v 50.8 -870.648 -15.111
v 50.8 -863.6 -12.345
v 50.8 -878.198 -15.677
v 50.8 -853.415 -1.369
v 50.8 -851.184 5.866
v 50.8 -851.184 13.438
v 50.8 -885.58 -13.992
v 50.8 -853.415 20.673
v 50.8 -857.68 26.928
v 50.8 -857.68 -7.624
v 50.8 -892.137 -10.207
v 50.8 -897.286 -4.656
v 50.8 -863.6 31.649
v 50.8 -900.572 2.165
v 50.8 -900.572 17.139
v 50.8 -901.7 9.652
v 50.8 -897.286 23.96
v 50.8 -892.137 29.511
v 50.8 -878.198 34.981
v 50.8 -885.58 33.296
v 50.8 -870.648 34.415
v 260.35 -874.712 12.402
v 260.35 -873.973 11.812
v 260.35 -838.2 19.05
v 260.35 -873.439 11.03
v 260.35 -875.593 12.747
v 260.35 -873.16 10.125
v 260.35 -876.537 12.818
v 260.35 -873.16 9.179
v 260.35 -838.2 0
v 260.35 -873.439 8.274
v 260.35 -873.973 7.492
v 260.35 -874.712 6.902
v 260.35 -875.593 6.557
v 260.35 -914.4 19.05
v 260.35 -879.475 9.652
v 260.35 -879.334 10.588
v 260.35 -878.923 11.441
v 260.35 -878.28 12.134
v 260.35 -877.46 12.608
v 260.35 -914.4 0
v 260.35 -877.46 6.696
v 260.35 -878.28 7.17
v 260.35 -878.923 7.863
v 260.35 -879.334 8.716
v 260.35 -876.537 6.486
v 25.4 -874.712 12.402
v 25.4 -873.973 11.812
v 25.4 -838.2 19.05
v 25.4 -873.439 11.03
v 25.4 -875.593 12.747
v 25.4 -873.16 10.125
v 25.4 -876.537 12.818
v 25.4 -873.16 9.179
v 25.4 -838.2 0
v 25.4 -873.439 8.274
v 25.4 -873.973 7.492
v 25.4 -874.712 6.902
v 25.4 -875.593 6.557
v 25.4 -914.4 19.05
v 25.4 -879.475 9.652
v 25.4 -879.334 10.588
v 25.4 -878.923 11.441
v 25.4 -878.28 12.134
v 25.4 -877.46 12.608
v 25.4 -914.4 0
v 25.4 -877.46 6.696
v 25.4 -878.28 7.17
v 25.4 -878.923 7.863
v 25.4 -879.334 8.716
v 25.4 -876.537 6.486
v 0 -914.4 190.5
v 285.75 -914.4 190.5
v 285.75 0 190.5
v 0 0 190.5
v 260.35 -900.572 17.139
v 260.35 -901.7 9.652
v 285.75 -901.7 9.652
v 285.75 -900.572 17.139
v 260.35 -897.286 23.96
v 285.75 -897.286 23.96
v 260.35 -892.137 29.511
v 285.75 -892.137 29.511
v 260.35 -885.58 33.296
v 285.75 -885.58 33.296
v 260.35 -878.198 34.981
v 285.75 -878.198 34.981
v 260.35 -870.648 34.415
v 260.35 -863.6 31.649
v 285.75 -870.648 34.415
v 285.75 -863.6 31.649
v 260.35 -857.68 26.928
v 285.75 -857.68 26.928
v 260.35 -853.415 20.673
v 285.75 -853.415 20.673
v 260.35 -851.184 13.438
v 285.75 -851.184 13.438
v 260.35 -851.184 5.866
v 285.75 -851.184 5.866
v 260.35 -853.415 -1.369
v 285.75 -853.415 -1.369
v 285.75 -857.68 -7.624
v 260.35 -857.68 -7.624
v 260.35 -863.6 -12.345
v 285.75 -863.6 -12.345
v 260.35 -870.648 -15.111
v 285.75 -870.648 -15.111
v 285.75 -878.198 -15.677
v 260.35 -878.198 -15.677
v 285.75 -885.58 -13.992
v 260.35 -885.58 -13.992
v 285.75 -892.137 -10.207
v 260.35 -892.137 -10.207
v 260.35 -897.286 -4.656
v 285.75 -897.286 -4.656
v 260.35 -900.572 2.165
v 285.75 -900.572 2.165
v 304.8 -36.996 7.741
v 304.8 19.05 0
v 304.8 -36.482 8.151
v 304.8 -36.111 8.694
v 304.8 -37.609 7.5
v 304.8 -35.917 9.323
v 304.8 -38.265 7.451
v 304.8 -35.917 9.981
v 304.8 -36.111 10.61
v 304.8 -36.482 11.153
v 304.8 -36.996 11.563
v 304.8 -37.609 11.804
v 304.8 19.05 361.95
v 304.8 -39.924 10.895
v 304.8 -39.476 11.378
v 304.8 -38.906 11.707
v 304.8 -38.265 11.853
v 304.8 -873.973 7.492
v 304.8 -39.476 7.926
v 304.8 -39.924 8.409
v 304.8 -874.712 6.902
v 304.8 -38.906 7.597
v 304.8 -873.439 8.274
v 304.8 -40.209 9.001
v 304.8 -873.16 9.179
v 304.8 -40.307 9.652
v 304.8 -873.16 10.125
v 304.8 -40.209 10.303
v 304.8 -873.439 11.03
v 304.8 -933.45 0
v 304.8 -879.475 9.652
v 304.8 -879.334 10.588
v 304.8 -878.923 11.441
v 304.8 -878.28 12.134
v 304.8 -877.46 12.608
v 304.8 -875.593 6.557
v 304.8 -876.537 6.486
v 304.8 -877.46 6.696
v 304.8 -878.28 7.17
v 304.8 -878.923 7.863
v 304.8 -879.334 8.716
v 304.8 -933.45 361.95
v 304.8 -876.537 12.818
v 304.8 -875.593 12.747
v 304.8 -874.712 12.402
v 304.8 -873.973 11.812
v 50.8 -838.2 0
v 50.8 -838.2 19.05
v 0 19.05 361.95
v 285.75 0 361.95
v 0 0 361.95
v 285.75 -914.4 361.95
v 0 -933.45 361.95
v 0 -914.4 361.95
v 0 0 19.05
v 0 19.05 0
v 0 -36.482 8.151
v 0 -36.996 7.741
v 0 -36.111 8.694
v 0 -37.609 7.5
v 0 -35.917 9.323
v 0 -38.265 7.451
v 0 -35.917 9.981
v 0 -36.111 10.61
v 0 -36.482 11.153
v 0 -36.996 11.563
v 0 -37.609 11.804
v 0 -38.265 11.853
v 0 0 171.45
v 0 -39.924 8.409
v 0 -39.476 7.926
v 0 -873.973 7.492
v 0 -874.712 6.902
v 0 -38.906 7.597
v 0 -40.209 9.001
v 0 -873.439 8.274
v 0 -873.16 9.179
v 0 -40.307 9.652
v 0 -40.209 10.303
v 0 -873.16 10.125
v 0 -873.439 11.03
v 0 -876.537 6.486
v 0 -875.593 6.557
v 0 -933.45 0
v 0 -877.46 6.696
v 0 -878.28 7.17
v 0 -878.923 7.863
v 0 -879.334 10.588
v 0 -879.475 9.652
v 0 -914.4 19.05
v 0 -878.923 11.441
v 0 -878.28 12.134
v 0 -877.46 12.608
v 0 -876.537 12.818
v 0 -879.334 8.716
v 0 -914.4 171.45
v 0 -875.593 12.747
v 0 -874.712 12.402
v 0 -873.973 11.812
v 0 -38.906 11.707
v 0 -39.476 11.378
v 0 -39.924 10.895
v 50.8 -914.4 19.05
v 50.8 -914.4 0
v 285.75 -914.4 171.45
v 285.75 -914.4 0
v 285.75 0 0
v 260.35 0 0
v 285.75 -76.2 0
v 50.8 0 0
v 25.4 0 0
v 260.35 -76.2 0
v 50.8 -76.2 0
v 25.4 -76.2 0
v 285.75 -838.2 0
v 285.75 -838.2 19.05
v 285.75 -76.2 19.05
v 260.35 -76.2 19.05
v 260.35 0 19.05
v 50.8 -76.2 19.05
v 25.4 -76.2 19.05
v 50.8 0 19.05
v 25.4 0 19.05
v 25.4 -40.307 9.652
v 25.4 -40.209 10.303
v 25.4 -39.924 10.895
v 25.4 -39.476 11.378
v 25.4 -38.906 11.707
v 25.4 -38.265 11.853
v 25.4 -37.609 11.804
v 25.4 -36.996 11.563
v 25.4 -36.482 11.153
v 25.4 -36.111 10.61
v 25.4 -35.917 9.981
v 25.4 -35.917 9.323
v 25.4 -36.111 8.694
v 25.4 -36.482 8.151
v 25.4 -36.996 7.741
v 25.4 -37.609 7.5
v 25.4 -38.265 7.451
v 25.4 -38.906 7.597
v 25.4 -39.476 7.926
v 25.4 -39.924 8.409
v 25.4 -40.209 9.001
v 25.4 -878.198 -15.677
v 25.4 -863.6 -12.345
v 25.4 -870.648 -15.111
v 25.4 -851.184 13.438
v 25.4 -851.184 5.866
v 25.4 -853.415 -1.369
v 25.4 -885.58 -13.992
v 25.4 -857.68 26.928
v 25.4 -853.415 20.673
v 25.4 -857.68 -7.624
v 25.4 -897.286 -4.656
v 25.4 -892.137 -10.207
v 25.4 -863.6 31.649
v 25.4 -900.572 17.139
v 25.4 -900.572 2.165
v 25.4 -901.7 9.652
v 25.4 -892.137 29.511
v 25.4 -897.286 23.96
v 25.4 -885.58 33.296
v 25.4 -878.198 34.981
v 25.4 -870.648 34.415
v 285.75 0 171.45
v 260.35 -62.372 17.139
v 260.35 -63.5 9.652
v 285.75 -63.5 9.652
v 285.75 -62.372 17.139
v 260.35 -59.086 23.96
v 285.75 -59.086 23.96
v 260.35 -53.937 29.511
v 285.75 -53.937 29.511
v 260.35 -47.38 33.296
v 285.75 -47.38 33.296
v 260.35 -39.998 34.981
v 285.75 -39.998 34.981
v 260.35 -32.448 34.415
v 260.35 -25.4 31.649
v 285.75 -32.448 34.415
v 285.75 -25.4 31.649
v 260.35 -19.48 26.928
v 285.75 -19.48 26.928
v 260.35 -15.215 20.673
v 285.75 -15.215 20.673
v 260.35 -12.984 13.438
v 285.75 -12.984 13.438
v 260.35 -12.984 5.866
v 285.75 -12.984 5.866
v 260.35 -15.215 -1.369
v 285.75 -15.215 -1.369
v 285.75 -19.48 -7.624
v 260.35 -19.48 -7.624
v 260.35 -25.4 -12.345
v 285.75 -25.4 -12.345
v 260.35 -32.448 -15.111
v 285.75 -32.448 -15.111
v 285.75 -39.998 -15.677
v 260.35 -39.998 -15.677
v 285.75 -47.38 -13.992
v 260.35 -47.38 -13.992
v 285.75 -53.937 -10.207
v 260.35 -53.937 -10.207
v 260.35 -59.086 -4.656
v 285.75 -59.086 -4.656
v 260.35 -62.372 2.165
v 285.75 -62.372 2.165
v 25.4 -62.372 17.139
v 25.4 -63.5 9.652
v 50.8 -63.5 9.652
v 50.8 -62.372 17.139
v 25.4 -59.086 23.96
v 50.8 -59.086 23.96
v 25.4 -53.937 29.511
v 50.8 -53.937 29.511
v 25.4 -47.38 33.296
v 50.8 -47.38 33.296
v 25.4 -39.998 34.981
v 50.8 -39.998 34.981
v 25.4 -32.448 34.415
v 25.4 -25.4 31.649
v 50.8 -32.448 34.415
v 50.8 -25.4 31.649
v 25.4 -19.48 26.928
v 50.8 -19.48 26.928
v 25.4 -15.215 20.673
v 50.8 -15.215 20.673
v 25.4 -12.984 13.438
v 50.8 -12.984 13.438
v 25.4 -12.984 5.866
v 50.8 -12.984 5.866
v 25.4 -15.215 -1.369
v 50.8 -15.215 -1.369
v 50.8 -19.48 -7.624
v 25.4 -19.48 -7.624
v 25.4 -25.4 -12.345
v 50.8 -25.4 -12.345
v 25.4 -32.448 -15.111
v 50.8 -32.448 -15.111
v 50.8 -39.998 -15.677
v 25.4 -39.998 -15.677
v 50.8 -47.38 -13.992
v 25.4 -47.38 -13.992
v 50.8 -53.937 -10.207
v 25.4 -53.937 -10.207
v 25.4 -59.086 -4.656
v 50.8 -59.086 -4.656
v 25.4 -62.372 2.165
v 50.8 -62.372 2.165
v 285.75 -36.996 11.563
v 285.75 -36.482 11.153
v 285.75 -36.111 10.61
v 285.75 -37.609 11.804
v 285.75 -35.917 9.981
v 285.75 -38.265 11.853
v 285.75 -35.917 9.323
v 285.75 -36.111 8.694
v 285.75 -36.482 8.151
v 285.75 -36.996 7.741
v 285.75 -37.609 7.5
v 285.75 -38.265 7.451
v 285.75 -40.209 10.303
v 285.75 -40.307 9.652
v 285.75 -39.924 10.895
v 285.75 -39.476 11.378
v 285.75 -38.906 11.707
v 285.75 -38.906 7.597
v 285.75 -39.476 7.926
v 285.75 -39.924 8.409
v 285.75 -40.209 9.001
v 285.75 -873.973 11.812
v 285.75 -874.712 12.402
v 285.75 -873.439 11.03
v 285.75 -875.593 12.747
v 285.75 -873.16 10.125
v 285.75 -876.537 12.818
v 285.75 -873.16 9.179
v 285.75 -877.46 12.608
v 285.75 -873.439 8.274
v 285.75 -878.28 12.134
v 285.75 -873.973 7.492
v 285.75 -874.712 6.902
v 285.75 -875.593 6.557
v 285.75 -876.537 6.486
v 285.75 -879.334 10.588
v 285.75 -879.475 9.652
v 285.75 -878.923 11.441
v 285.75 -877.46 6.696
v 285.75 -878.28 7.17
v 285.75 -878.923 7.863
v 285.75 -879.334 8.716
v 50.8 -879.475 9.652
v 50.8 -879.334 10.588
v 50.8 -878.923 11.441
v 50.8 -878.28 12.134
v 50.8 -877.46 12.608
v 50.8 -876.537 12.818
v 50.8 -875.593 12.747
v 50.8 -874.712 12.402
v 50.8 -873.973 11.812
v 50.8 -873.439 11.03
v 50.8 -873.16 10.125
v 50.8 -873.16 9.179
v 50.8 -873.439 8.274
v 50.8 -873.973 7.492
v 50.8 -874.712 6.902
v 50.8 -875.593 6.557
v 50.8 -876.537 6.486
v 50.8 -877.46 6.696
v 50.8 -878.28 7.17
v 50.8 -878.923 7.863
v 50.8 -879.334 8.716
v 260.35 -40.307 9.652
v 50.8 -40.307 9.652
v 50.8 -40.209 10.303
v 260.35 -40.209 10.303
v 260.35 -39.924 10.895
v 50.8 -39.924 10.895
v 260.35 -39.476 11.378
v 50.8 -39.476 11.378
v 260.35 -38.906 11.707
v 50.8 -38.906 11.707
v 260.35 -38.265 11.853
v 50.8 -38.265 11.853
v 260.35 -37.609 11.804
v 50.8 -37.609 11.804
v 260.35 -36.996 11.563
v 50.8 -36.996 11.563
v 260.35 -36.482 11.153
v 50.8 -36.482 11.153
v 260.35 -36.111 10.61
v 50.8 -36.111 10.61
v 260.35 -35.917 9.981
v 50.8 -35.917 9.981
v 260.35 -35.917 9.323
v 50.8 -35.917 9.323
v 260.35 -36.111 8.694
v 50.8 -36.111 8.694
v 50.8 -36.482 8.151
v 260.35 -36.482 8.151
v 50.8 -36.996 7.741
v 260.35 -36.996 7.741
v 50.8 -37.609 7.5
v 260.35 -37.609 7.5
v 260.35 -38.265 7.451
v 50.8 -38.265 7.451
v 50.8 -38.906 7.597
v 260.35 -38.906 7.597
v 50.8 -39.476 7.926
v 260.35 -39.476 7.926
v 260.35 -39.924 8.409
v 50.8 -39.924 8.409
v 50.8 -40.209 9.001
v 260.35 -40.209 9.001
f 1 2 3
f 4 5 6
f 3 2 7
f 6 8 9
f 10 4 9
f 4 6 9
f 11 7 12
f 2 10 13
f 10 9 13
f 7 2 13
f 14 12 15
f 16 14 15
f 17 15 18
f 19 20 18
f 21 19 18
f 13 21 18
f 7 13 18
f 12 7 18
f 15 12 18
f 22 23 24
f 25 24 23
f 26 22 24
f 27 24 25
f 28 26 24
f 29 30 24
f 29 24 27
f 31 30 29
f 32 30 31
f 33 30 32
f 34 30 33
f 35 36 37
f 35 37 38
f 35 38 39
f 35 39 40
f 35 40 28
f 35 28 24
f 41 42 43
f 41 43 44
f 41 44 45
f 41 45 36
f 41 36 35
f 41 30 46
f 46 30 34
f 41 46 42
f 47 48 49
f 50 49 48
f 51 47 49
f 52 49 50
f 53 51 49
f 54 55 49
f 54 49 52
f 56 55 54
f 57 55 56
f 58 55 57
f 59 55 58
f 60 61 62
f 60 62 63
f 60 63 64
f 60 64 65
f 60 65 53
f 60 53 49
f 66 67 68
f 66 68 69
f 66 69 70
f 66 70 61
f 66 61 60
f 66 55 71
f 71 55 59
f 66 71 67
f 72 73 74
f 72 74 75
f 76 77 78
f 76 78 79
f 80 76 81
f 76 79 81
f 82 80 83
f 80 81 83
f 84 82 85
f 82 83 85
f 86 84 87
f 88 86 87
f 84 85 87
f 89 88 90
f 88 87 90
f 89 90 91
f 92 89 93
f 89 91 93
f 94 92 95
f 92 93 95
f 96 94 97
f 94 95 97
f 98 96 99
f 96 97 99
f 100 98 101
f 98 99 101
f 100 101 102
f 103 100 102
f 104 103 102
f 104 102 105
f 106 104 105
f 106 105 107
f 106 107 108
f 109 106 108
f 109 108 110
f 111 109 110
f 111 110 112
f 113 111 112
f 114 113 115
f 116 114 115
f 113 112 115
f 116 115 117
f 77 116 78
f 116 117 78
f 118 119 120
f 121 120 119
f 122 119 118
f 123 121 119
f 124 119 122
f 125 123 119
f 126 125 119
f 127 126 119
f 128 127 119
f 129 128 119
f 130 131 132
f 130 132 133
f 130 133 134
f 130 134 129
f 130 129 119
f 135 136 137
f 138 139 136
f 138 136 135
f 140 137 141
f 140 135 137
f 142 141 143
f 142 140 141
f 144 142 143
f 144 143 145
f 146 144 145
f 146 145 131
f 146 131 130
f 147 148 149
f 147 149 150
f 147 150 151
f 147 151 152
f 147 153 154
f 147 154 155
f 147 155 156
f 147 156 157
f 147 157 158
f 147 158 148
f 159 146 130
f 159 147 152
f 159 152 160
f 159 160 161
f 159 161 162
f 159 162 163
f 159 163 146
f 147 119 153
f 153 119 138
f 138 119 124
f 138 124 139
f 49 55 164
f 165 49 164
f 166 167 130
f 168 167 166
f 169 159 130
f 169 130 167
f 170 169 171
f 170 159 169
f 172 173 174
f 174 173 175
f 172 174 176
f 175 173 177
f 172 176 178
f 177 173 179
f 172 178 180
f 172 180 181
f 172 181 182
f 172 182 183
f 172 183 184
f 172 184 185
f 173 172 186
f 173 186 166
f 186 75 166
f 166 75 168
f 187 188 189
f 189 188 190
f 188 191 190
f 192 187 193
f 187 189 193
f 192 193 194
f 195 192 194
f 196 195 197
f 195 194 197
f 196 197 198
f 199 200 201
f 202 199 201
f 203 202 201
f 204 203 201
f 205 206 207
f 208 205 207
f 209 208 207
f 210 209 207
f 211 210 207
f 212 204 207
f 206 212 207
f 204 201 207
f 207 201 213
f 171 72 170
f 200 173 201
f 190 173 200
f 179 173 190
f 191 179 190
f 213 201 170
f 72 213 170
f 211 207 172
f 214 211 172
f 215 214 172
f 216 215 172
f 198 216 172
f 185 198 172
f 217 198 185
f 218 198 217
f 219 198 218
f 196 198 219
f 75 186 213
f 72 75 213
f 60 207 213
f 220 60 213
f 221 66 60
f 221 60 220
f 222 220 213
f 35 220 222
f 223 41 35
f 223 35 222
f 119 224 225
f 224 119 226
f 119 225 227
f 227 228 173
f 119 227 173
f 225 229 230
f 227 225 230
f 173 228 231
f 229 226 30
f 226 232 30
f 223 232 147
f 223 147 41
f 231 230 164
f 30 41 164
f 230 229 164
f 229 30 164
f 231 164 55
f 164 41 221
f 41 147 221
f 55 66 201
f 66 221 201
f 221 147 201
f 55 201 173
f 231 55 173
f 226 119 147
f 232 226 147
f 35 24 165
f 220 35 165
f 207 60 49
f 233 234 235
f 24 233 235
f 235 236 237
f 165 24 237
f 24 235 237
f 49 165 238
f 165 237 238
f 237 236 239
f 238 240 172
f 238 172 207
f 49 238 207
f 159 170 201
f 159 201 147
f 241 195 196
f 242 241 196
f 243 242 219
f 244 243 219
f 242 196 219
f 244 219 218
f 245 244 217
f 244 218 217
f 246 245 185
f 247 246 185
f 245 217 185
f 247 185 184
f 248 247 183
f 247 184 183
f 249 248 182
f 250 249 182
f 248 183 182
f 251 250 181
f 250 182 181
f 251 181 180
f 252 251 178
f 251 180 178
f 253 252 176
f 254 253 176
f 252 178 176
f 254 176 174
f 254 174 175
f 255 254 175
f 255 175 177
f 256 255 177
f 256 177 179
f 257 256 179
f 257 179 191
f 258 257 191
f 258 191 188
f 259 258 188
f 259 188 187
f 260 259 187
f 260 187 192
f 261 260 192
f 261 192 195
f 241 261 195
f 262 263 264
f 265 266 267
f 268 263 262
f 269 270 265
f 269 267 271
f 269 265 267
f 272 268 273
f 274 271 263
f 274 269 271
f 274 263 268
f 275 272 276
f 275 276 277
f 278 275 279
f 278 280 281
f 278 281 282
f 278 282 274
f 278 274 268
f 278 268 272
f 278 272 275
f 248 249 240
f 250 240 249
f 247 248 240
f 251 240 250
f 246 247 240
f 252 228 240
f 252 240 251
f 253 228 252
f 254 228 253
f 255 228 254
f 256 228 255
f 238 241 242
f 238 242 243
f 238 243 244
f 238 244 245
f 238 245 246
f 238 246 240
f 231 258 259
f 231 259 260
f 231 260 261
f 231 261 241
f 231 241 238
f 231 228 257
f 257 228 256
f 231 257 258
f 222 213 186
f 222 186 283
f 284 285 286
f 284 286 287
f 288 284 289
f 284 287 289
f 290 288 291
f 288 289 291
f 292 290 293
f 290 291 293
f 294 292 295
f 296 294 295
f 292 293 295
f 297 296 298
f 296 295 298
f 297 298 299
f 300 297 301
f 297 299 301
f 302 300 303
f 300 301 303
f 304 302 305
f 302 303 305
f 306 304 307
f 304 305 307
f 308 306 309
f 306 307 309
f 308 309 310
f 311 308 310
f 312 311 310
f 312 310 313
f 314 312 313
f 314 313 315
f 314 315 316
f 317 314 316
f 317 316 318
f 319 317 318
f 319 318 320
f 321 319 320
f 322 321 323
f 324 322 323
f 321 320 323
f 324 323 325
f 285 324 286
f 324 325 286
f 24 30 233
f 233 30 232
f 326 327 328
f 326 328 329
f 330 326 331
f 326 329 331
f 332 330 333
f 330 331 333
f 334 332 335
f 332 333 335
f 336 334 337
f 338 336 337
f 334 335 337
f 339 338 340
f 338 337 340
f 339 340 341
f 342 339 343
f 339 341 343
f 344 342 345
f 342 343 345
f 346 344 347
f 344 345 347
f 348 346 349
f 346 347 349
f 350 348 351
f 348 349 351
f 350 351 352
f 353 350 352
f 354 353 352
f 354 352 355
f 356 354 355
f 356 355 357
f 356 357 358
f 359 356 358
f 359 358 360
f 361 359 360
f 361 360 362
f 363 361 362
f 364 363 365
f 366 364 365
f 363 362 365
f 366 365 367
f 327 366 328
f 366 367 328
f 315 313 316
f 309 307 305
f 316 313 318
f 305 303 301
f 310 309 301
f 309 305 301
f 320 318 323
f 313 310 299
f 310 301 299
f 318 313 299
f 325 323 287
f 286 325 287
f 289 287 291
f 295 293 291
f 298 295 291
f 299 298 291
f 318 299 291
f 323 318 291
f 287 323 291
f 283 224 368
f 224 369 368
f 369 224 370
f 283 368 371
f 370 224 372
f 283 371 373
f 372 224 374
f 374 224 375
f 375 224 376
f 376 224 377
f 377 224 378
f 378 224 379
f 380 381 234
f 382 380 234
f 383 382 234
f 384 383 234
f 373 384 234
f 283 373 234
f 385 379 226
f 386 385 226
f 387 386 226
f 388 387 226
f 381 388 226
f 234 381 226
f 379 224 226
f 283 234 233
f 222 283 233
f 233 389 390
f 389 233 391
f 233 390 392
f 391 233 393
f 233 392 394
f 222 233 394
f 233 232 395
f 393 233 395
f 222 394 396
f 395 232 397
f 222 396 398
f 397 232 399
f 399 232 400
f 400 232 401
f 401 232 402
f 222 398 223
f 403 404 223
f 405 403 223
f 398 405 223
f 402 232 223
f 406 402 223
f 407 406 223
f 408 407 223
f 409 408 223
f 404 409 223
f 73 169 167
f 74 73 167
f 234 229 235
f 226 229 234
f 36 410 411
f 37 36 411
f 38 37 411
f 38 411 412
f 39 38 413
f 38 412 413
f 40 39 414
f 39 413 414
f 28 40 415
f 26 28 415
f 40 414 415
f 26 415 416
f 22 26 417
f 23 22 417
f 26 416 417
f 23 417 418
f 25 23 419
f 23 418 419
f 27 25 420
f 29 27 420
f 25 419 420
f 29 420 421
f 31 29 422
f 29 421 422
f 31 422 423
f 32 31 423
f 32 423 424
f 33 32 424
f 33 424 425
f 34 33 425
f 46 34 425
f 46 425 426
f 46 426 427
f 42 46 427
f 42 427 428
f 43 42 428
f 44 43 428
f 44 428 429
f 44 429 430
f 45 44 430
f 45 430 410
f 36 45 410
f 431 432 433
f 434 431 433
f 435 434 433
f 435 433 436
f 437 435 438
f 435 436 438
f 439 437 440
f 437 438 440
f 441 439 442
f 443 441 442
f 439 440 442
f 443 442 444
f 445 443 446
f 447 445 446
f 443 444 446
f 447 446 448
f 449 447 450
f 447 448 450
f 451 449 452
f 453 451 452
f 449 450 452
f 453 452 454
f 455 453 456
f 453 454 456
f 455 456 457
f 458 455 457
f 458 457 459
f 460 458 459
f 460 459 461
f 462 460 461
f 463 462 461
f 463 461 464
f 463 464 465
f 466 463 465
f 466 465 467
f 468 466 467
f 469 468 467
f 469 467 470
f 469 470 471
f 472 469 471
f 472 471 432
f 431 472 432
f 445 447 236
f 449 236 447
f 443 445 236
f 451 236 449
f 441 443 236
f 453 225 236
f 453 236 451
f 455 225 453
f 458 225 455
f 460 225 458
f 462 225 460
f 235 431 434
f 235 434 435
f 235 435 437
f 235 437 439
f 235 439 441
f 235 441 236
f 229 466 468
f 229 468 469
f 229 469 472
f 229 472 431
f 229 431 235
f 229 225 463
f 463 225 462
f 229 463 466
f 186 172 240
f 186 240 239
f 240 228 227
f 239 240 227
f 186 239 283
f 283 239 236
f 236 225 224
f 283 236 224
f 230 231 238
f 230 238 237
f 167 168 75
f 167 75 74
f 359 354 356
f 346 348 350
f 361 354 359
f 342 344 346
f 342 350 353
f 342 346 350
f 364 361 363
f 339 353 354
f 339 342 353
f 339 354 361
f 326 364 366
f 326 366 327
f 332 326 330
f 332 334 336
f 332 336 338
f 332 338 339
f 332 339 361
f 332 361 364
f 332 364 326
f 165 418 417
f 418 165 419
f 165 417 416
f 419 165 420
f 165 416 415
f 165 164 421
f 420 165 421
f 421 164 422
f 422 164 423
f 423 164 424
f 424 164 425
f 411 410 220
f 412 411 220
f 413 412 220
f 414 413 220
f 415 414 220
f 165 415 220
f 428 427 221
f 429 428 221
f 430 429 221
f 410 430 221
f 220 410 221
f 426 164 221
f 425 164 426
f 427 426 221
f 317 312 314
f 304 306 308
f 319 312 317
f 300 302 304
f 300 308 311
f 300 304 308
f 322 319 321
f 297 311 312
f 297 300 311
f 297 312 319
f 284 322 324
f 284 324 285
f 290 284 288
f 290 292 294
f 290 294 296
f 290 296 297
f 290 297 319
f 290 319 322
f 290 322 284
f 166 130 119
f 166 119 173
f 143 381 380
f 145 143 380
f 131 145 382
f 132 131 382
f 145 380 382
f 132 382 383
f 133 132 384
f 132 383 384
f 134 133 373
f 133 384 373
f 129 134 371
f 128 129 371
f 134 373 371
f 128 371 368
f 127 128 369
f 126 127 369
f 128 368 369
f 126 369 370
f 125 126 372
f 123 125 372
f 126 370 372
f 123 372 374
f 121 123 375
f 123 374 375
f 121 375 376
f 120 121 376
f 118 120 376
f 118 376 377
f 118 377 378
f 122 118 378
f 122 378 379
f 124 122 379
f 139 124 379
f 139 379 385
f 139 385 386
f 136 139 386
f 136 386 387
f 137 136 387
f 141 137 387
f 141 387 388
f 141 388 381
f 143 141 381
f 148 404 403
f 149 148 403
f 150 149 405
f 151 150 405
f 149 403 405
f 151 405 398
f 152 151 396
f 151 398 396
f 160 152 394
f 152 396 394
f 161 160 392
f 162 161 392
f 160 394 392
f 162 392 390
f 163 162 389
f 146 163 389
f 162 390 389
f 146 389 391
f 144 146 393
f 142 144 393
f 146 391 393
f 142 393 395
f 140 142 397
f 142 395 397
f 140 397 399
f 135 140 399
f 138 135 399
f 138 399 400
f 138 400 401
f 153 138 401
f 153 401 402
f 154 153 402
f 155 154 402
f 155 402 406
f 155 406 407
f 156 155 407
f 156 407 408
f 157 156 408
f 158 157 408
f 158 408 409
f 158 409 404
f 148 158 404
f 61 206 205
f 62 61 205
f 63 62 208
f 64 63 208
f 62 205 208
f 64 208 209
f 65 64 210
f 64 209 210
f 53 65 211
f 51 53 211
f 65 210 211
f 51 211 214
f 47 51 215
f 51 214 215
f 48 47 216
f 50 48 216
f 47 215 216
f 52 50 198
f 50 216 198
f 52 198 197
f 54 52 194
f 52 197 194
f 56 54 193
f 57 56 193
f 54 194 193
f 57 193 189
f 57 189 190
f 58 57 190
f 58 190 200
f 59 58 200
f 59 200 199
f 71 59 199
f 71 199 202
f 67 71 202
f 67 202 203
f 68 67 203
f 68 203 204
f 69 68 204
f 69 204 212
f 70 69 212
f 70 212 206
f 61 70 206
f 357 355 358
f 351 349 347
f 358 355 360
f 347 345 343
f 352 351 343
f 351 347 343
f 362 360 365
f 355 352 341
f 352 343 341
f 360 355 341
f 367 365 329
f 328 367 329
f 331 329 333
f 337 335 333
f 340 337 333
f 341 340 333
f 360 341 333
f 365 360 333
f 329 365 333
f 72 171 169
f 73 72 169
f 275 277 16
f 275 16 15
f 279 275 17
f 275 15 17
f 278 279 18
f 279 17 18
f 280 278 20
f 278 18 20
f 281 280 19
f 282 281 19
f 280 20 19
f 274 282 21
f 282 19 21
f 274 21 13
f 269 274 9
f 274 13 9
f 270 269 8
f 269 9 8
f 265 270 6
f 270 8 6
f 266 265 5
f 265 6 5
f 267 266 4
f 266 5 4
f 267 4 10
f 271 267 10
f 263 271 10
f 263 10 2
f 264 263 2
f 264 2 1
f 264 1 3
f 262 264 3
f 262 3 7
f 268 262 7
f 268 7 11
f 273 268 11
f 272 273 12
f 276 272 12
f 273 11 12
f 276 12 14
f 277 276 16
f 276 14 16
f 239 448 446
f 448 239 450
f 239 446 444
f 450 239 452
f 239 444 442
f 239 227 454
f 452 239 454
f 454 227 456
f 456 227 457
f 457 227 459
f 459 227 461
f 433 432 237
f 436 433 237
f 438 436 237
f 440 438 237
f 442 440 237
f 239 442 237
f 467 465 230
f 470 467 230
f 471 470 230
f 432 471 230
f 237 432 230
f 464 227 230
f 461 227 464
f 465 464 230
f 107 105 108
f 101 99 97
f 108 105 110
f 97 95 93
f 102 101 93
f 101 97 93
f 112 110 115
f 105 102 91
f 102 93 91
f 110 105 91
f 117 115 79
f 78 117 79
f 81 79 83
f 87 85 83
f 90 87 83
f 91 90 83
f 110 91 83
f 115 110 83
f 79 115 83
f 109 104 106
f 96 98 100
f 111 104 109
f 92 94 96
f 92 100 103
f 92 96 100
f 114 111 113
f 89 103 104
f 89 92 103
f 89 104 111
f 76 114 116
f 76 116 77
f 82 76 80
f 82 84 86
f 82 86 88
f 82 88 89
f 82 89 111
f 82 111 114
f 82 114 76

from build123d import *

# Parameters (mm, degrees)
F1_DEPTH  = 914.4
F2_W      = 304.8
F2_H      = 361.95
F3_DEPTH  = 19.05
F4_W      = 304.8
F4_H      = 361.95
F5_DEPTH  = 19.05
F6_W      = 285.75
F6_H      = 914.4
F7_DEPTH  = 25.4
F8_W      = 25.4
F8_H      = 76.2
F9_DEPTH  = 25.4
F10_R     = 3.175
F10_R_2   = 2.20718
F11_DEPTH = 304.801
F12_R     = 25.4
F13_DEPTH = 25.4
F14_R     = 25.4
F15_DEPTH = 25.4


with BuildPart() as f1:
    # F0 (on Front) → F1 (new body)
    with BuildSketch(Plane.XZ):
        Polygon((0, 19.05), (0, 0), (304.8, 0), (304.8, 361.95), (0, 361.95), (0, 342.9), (285.75, 342.9), (285.75, 190.5), (0, 190.5), (0, 171.45), (285.75, 171.45), (285.75, 19.05), align=None)
    extrude(amount=F1_DEPTH)

    # F2 (on face) → F3 (join)
    with BuildSketch(Plane.XZ.offset(914.4)):
        with Locations((152.4, 180.975)):
            Rectangle(F2_W, F2_H)
    extrude(amount=F3_DEPTH)

    # F4 (on face) → F5 (join)
    with BuildSketch(Plane(origin=(0, 0, 0), x_dir=(-1, 0, 0), z_dir=(0, 1, 0))):
        with Locations((-152.4, 180.975)):
            Rectangle(F4_W, F4_H)
    extrude(amount=F5_DEPTH)

    # F6 (on face) → F7 (cut)
    with BuildSketch(Plane.XY.offset(361.95)):
        with Locations((142.875, -457.2)):
            Rectangle(F6_W, F6_H)
    extrude(amount=-F7_DEPTH, mode=Mode.SUBTRACT)

    # F8 (on face) → F9 (cut)
    with BuildSketch(Plane(origin=(0, 0, 0), x_dir=(1, 0, 0), z_dir=(0, 0, -1))):
        with Locations((38.1, 876.3)):
            Rectangle(F8_W, F8_H)
        with Locations((273.05, 876.3)):
            Rectangle(F8_W, F8_H)
        with Locations((273.05, 38.1)):
            Rectangle(F8_W, F8_H)
        with Locations((38.1, 38.1)):
            Rectangle(F8_W, F8_H)
    extrude(amount=-F9_DEPTH, mode=Mode.SUBTRACT)

    # F10 (on face) → F11 (cut, through all)
    with BuildSketch(Plane(origin=(0, 0, 0), x_dir=(0, -1, 0), z_dir=(-1, 0, 0))):
        with Locations((876.3, 9.652)):
            Circle(F10_R)
        with Locations((38.1, 9.652)):
            Circle(F10_R_2)
    extrude(amount=-F11_DEPTH, mode=Mode.SUBTRACT)


with BuildPart() as f13:
    # F12 (on face) → F13 (new body)
    with BuildSketch(Plane(origin=(50.8, 0, 0), x_dir=(0, -1, 0), z_dir=(-1, 0, 0))):
        with Locations((876.3, 9.652)):
            Circle(F12_R)
        with Locations((38.1, 9.652)):
            Circle(F12_R)
    extrude(amount=F13_DEPTH)


with BuildPart() as f15:
    # F14 (on face) → F15 (new body)
    with BuildSketch(Plane(origin=(285.75, 0, 0), x_dir=(0, -1, 0), z_dir=(-1, 0, 0))):
        with Locations((876.3, 9.652)):
            Circle(F14_R)
        with Locations((38.1, 9.652)):
            Circle(F14_R)
    extrude(amount=F15_DEPTH)


solid = Compound([f1.part, f13.part, f15.part])
